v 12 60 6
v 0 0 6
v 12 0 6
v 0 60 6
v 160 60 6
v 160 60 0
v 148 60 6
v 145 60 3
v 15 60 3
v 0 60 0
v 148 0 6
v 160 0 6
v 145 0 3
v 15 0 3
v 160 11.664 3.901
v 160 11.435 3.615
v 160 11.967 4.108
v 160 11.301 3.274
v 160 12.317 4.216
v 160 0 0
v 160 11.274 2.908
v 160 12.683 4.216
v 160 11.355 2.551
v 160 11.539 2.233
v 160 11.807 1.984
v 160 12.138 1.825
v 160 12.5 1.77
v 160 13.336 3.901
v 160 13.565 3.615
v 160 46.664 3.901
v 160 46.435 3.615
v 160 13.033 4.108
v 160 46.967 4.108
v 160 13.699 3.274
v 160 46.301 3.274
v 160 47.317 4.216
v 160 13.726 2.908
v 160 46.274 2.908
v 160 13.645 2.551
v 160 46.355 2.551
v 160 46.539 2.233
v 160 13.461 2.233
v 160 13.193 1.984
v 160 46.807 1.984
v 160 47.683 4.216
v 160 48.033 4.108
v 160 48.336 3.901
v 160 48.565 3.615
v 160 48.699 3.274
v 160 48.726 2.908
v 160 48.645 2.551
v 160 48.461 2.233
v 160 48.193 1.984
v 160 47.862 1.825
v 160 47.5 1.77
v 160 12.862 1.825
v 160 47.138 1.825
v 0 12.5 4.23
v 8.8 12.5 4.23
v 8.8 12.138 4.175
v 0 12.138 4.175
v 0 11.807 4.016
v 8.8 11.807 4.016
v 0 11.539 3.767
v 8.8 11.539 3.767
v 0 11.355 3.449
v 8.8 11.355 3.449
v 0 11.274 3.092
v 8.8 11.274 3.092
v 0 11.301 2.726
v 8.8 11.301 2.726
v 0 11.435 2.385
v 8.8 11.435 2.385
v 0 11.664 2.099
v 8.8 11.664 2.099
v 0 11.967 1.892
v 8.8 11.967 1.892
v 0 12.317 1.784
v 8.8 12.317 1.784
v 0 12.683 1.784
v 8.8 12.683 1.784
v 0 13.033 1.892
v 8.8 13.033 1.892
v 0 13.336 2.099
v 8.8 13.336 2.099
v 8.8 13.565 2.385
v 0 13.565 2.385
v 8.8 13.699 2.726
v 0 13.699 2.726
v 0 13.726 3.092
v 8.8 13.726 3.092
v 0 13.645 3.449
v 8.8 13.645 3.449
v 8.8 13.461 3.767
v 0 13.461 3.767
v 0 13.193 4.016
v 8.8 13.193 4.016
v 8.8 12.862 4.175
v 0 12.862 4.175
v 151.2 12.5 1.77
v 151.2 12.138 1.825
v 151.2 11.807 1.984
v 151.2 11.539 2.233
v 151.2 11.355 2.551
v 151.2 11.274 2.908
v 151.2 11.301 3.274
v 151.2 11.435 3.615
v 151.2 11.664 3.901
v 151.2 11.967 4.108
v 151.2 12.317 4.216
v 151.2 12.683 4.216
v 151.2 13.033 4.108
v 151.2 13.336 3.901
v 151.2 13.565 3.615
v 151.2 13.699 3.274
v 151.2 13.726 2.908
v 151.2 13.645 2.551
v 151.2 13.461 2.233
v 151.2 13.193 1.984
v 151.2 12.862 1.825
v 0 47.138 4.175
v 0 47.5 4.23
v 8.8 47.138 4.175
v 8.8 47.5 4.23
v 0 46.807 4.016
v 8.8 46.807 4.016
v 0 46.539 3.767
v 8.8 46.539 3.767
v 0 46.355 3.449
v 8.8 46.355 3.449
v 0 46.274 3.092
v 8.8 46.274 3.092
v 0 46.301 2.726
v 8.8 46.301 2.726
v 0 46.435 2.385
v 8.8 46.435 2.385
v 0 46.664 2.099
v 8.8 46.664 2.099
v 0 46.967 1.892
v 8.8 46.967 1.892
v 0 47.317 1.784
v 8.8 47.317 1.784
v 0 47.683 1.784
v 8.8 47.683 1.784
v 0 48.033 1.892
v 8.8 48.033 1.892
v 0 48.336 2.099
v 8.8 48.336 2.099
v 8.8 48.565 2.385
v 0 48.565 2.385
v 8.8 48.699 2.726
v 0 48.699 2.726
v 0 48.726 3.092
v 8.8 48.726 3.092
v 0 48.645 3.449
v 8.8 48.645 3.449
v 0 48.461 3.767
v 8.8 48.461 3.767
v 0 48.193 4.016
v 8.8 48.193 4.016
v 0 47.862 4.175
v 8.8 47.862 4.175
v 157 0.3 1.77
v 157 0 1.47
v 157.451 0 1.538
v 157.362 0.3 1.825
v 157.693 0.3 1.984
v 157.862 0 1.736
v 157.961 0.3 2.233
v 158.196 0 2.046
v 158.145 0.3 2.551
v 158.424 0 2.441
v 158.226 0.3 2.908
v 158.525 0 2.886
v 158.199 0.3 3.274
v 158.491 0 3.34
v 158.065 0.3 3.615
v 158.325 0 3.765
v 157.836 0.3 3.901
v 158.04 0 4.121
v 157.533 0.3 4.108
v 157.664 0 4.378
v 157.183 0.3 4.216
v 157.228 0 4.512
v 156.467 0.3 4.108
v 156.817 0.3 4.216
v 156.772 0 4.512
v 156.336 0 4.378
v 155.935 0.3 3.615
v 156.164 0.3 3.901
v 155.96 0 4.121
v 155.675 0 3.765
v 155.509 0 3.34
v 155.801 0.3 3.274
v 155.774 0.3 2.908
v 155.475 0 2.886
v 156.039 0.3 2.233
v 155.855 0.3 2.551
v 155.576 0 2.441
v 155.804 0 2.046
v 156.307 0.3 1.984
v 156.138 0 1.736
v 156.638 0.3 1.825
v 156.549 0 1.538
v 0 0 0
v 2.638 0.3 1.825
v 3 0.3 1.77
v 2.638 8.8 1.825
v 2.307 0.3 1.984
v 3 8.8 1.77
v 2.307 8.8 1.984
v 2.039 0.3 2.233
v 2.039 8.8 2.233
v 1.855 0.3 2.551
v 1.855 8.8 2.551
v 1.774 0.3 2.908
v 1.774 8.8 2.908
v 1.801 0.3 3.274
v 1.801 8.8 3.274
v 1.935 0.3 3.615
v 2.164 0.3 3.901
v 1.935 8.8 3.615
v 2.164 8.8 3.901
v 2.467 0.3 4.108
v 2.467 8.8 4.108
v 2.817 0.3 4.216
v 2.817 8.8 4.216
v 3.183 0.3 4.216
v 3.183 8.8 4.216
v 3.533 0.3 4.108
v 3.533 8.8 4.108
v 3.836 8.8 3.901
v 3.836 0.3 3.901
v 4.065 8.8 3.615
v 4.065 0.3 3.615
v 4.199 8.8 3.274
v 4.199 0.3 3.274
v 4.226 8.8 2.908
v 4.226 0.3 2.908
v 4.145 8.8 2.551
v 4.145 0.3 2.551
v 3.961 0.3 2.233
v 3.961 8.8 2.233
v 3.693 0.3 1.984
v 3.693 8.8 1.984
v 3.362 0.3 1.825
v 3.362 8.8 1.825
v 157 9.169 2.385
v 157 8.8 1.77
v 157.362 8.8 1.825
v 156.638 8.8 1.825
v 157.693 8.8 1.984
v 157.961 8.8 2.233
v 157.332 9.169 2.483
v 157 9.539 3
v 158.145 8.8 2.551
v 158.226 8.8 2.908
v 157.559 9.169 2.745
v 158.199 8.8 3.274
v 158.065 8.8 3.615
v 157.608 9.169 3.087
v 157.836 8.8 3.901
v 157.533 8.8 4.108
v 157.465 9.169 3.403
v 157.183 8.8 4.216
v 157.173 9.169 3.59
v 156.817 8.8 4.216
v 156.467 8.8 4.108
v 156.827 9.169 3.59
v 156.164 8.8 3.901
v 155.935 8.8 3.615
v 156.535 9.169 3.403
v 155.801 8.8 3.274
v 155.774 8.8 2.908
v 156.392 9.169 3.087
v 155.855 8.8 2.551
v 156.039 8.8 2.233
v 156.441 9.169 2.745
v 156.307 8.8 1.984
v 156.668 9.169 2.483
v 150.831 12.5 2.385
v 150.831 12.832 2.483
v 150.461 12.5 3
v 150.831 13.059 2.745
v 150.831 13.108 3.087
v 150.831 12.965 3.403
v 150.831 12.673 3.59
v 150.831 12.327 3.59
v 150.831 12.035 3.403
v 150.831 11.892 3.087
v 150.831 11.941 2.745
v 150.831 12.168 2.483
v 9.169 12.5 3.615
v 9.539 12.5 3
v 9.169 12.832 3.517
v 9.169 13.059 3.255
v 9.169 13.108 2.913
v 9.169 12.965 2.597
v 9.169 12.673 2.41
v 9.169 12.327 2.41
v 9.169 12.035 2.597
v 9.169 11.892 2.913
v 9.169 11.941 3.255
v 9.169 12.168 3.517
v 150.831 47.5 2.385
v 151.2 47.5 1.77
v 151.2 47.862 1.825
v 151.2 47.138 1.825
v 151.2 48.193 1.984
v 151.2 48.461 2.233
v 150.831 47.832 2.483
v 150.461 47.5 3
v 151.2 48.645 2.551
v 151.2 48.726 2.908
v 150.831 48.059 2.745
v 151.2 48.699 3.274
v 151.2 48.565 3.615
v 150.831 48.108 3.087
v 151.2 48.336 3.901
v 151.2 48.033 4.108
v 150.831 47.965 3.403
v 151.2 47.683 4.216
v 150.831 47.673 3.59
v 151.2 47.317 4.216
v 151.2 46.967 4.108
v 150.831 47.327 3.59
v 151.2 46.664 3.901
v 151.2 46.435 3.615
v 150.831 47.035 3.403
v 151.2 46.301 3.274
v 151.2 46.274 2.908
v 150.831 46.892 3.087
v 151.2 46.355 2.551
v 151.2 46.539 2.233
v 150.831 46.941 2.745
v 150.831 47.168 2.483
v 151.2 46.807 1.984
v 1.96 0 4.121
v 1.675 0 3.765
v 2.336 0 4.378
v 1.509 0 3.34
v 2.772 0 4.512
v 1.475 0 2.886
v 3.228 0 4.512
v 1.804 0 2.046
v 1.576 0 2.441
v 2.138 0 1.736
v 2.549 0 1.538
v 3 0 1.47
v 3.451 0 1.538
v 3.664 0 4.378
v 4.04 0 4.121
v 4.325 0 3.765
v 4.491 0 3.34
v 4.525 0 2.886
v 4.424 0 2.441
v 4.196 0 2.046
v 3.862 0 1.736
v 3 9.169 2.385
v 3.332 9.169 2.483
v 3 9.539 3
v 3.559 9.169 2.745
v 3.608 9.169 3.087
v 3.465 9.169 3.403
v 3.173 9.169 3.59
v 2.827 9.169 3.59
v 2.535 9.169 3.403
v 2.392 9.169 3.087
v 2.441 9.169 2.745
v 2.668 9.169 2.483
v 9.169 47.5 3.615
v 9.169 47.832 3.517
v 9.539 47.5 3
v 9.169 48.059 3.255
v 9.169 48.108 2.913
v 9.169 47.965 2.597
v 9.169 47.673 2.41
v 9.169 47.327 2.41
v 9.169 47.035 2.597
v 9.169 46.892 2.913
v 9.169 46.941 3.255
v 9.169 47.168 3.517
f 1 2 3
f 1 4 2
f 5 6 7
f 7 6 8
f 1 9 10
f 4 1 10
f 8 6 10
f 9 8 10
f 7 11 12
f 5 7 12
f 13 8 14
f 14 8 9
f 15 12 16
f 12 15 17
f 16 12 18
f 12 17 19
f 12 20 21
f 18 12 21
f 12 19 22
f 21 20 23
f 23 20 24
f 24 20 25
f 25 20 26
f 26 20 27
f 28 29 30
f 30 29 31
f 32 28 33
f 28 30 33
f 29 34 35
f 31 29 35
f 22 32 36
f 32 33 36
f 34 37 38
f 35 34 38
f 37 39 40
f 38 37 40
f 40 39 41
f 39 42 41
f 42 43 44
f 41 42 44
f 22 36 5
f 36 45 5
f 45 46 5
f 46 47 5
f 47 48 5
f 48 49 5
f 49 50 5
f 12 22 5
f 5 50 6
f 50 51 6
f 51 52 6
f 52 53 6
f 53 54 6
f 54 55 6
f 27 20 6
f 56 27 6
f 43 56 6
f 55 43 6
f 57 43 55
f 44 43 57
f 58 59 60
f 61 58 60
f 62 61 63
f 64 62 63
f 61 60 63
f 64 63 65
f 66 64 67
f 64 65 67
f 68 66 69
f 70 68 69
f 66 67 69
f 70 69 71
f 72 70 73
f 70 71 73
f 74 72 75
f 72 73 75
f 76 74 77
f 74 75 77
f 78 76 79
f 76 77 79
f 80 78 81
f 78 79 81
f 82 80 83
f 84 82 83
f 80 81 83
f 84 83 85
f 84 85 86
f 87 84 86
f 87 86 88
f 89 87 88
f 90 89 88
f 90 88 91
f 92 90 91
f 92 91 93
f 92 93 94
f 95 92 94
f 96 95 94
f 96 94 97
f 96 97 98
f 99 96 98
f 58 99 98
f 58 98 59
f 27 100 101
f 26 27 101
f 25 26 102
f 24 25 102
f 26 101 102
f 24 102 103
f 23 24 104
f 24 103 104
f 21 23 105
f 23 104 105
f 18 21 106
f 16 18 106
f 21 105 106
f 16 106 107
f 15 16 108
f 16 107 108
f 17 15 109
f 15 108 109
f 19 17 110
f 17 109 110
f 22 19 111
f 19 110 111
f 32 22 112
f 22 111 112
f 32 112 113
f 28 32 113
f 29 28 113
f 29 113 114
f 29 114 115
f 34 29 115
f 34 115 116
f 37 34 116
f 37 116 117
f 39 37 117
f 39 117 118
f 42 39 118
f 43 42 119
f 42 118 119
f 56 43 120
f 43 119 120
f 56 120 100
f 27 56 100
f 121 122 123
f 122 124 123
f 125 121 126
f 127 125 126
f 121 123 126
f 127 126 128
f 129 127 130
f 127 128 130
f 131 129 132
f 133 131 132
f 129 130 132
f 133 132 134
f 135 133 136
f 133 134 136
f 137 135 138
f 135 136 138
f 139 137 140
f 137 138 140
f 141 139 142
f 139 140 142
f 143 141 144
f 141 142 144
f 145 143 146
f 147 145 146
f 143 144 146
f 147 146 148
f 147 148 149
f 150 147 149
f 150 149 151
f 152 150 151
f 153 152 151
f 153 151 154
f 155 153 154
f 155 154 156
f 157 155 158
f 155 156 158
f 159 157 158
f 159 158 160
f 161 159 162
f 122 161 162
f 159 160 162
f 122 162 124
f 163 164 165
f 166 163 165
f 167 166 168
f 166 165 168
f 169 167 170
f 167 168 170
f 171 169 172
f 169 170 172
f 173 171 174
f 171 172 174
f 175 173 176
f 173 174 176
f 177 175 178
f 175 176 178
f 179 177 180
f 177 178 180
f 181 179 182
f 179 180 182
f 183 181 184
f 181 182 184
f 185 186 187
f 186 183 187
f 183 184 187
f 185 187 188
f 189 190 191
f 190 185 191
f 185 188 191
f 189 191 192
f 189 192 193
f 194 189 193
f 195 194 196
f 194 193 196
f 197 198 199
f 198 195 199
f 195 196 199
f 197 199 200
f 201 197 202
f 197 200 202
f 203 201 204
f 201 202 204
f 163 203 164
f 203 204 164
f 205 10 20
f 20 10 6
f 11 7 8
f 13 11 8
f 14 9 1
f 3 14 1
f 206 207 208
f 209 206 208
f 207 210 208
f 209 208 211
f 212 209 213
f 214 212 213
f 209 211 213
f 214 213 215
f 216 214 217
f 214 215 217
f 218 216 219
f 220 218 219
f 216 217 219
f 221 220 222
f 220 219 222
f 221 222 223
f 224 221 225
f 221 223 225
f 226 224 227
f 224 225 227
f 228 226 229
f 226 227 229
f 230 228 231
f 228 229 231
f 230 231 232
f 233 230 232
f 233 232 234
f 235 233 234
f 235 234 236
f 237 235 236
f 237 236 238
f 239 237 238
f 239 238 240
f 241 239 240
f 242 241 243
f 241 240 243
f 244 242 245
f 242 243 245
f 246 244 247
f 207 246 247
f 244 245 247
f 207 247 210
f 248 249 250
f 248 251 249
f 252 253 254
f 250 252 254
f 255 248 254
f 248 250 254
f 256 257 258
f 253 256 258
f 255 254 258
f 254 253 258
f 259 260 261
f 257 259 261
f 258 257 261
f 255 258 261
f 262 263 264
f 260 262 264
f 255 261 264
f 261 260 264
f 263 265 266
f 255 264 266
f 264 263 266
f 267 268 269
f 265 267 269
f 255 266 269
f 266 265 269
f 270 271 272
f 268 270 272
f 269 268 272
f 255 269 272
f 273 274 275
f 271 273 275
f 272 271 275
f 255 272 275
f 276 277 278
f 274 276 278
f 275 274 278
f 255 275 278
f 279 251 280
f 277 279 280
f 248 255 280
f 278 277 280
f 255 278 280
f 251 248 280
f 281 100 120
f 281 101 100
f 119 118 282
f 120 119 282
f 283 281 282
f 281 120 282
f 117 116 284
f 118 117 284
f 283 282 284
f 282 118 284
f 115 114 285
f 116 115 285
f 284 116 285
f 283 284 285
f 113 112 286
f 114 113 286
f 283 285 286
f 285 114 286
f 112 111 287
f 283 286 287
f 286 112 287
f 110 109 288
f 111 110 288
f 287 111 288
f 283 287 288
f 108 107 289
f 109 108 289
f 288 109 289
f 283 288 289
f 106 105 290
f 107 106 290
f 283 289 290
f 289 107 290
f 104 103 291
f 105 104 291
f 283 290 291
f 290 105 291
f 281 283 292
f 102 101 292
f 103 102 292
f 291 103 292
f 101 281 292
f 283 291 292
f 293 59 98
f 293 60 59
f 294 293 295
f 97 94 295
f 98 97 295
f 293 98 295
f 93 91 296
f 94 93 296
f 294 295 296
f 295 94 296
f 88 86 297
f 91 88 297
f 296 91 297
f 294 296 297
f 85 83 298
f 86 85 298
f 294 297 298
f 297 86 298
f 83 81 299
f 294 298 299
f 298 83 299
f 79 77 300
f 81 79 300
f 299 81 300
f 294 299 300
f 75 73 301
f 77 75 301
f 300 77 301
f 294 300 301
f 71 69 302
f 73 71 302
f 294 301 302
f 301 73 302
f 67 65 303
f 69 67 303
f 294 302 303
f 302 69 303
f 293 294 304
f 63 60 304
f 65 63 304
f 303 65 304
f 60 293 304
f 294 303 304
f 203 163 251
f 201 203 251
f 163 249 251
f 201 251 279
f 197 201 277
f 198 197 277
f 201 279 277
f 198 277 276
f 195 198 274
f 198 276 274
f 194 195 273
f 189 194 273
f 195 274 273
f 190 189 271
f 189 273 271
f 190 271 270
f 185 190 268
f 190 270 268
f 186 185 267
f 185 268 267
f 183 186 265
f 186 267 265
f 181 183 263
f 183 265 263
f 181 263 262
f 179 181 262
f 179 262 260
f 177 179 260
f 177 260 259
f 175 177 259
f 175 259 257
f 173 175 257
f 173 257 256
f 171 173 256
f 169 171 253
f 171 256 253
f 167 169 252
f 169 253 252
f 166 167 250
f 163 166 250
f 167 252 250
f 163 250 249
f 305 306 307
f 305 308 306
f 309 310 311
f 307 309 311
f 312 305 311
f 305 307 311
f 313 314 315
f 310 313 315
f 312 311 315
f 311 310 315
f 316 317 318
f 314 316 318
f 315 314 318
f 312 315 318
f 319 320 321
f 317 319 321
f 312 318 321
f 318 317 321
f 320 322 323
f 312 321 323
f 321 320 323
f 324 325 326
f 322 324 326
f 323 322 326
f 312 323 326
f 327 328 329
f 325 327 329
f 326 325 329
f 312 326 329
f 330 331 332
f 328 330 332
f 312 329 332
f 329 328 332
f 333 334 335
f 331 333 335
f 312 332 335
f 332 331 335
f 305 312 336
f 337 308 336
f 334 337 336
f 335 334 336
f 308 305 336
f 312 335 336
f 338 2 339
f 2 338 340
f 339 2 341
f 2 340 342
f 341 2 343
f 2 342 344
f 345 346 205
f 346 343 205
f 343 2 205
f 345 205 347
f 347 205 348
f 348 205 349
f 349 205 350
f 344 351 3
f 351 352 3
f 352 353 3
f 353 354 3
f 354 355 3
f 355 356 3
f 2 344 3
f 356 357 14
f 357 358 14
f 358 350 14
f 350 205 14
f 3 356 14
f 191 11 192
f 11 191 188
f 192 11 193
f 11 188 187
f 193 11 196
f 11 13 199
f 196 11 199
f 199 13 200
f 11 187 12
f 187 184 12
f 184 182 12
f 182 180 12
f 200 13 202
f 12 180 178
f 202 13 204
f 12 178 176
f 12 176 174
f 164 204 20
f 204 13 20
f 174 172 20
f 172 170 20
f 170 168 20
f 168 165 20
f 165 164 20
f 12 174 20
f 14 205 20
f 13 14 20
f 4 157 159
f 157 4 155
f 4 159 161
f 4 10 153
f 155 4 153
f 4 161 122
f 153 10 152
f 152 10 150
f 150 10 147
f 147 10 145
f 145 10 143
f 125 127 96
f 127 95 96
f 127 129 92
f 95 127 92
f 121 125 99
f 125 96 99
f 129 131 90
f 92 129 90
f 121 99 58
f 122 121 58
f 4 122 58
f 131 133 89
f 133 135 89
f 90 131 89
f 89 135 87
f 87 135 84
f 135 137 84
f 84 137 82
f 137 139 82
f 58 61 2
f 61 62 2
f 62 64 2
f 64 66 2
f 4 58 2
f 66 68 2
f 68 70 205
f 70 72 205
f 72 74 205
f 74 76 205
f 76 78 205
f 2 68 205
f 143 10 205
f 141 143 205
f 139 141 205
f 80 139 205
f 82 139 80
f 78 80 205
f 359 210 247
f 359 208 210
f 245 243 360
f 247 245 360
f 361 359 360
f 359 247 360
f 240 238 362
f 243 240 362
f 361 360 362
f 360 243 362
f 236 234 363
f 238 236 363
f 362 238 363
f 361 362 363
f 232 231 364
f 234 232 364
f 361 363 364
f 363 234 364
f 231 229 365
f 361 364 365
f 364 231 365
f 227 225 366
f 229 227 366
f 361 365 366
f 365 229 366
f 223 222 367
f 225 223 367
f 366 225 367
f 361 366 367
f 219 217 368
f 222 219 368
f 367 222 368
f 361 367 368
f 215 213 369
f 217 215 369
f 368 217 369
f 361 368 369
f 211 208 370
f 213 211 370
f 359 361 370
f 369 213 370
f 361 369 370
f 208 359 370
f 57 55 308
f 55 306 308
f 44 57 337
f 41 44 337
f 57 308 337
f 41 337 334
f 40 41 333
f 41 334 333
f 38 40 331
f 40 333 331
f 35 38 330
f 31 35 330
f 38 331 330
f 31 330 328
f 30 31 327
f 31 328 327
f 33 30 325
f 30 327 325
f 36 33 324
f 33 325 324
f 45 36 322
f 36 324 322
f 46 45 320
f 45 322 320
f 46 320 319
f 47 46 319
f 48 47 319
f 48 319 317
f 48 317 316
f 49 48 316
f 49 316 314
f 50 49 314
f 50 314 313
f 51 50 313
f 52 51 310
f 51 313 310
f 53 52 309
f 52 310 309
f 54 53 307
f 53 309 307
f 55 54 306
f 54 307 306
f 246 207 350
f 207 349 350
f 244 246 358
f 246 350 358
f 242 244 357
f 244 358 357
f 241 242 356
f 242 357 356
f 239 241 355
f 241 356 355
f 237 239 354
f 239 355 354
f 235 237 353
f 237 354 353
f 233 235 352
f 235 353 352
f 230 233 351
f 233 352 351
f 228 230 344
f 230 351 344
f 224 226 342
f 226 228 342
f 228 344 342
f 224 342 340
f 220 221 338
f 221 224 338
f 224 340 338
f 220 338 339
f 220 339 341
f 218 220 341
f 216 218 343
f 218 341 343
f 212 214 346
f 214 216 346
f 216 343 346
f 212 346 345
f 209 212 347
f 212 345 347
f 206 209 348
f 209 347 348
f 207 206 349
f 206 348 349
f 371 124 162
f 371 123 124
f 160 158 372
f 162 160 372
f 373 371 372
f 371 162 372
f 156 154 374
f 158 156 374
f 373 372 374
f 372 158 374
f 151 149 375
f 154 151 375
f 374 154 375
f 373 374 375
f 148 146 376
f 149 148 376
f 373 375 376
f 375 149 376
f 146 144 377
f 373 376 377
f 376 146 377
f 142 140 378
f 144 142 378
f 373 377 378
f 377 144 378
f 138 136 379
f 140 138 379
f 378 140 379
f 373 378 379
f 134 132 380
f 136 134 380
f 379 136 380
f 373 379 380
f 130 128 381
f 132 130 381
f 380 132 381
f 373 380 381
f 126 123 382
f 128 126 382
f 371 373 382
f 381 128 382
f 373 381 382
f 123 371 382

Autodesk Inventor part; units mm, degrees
ref_plane "YZ Plane" through (0, 0, 0) normal (1, 0, 0) x (0, 1, 0)
ref_plane "XZ Plane" through (0, 0, 0) normal (0, 1, 0) x (-1, 0, 0)
ref_plane "XY Plane" through (0, 0, 0) normal (0, 0, 1) x (1, 0, 0)
sketch "Sketch1" plane through (0, 0, 0) normal (0, 0, 1) x (1, 0, 0)
  line L0 (0, 0) -> (160, 0)
  line L1 (160, 0) -> (160, 60)
  line L2 (160, 60) -> (0, 60)
  line L3 (0, 60) -> (0, 0)
  dimension "d0" = 160
  dimension "d1" = 60
extrude "Extrusion1" add sketch "Sketch1" along normal blind 6
sketch "Sketch2" plane through (0, 0, 0) normal (0, -1, 0) x (1, 0, 0)
  line L0 (3, 3) -> (157, 3) construction
  line L1 (160, 0) -> (0, 0) construction
  line L2 (0, 6) -> (160, 6) construction
  line L3 (160, 0) -> (160, 6) construction
  line L4 (0, 0) -> (0, 6) construction
  point P0 (0, 3)
  dimension "d4" = 3
  dimension "d5" = 6
  dimension "d6" = 3
  dimension "d7" = 3
hole "Hole1" at (3, 0, 3) at (157, 0, 3) direction (0, 1, 0) diameter 2.459 depth 8.8 tip angle 118 thread size "M3x0.5" class "6H" standard "ISO Metric profile"
chamfer "Chamfer1" distance 0.3 angle 45 2 edges at (3, 0, 4.2295) (157, 0, 4.2295)
sketch "Sketch3" plane through (0, 60, 0) normal (0, 1, 0) x (1, 0, 0)
  line L0 (160, -6) -> (0, -6) projected
  line L1 (148, -6) -> (145, -3)
  line L2 (148, -6) -> (152.2426, -6) construction
  line L3 (145, -3) -> (15, -3)
  line L4 (160, 0) -> (0, 0) projected
  line L5 (15, -3) -> (12, -6)
  line L6 (12, -6) -> (148, -6)
  line L7 (160, 0) -> (160, -6) projected
  line L8 (0, 0) -> (0, -6) projected
  point P0 (12, -6)
  point P1 (0, -3)
  dimension "d18" = 135
  dimension "d19" = 3
  dimension "d22" = 15
  dimension "d23" = 130
  dimension "d24" = 15
extrude "Extrusion2" cut sketch "Sketch3" against normal through all contours L0 L5 L3 L1
sketch "Sketch6" plane through (160, 0, 0) normal (1, 0, 0) x (0, 0, -1)
  line L0 (-3, 60) -> (-3, 0) projected
  circle A0 centre (-3, 12.5) radius 1.5
  circle A1 centre (-3, 47.5) radius 1.5
  line L1 (0, 0) -> (-6, 0) projected
  line L2 (0, 60) -> (-6, 60) projected
  dimension "d34" = 3
  dimension "d35" = 3
  dimension "d36" = 35
  dimension "d37" = 12.5
  dimension "d38" = 60
hole "Hole2" at (160, 12.5, 3) at (160, 47.5, 3) direction (-1, 0, 0) diameter 2.459 depth 8.8 tip angle 118 thread size "M3x0.5" class "6H" standard "ISO Metric profile"
sketch "Sketch7" plane through (0, 0, 0) normal (-1, 0, 0) x (0, 0, 1)
  line L0 (3, 60) -> (3, 0) projected
  circle A0 centre (3, 12.5) radius 1.5
  circle A1 centre (3, 47.5) radius 1.5
  line L1 (0, 60) -> (6, 60) projected
  line L2 (0, 0) -> (6, 0) projected
  dimension "d46" = 3
  dimension "d47" = 3
  dimension "d48" = 35
  dimension "d49" = 60
  dimension "d50" = 12.5
hole "Hole3" at (0, 47.5, 3) at (0, 12.5, 3) direction (1, 0, 0) diameter 2.459 depth 8.8 tip angle 118 thread size "M3x0.5" class "6H" standard "ISO Metric profile"
equation "\"d4\" = 0.5 * d5"
equation "\"d7\" = d6"
equation "\"d22\" = d24"
equation "\"d37\" = -0.5 * d36 + 0.5 * d38"
equation "\"d50\" = -0.5 * d48 + 0.5 * d49"
properties part number "Prawa ściana"
